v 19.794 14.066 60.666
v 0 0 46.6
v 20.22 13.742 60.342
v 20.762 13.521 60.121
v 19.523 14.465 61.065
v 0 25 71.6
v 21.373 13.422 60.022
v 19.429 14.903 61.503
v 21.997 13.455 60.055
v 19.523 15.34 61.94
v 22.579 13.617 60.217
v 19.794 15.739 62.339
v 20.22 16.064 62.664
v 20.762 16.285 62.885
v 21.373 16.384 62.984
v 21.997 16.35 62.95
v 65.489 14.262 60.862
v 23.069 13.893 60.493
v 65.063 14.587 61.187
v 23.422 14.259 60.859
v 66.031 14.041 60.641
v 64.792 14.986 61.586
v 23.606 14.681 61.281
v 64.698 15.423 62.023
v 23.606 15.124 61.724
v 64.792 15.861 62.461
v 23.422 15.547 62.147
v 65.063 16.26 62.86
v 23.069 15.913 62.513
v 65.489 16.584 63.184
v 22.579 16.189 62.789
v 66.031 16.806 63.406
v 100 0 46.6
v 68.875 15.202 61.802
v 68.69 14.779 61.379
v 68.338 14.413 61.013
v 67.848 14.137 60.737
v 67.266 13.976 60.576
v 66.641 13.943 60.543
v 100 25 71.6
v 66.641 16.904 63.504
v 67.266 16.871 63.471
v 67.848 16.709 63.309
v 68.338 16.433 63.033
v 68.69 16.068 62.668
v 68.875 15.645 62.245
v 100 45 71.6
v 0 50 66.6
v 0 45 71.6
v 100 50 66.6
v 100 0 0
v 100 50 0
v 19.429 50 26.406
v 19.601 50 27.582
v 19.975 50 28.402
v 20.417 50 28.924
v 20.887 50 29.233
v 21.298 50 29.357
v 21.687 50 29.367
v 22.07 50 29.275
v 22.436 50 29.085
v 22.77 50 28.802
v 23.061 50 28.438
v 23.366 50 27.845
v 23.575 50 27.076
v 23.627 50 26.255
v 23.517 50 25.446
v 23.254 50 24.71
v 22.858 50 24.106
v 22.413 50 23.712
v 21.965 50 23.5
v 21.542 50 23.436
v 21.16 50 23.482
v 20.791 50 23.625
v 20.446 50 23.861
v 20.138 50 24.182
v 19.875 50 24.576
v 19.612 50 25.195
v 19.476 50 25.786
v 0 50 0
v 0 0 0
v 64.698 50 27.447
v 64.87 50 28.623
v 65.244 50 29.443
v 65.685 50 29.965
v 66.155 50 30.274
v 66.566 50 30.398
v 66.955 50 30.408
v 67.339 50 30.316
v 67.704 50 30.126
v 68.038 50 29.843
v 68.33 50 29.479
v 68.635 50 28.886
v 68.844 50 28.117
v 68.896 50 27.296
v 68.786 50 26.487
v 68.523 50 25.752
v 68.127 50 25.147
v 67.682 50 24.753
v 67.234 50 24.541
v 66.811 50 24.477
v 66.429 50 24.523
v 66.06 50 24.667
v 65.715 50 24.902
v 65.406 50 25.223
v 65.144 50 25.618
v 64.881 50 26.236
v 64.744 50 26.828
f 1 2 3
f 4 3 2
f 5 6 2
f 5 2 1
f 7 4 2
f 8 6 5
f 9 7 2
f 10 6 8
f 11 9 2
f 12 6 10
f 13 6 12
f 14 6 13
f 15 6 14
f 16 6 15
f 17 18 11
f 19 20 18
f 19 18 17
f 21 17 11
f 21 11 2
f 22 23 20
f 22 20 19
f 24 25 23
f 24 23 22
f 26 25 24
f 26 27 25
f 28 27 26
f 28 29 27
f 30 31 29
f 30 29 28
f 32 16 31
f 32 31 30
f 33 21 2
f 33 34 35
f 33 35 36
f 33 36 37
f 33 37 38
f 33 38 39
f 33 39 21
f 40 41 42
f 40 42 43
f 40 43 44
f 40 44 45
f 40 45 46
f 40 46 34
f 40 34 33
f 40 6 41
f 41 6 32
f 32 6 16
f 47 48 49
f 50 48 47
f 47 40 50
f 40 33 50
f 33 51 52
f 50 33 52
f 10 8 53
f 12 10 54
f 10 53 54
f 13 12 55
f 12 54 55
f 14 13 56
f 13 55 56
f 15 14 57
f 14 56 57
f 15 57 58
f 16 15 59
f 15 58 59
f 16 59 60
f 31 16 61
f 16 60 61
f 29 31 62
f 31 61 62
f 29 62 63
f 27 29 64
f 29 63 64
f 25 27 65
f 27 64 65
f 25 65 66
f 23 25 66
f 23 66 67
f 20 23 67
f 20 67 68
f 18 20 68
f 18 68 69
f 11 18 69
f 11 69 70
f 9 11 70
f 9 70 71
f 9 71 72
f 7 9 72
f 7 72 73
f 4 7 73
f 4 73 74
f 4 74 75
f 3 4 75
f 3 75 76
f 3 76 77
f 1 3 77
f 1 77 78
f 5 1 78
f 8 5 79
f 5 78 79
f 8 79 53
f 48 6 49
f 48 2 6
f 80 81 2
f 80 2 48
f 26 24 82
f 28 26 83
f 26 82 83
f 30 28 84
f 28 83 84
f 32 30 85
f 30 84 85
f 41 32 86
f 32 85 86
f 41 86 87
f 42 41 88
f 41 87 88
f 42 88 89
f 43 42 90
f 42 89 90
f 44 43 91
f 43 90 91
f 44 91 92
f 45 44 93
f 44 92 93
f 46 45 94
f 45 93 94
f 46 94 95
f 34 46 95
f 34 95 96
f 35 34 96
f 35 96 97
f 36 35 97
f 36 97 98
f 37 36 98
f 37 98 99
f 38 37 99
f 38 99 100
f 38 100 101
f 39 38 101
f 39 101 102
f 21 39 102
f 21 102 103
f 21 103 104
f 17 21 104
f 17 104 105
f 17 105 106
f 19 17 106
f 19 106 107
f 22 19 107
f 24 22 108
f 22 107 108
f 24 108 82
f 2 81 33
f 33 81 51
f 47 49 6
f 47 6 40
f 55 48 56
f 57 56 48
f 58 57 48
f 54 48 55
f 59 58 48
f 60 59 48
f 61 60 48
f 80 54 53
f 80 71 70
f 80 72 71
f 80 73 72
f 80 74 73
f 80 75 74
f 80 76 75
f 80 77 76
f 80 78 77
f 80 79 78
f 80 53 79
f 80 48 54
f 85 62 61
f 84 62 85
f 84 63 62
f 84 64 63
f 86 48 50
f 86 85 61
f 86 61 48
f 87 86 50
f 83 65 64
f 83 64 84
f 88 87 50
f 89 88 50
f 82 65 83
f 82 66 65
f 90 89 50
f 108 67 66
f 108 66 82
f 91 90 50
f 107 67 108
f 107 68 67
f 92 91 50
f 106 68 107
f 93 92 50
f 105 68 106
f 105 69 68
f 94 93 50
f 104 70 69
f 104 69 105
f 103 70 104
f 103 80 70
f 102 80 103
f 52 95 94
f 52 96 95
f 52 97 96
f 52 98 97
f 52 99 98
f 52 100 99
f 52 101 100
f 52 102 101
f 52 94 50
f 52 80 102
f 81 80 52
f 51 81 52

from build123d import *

# Parameters (mm, degrees)
F0_W     = 100
F0_H     = 50
F1_DEPTH = 71.6
F2_SIZE  = 25
F4_D     = 4.2
F5_SIZE  = 5


with BuildPart() as f1:
    # F0 (on Top) → F1 (new body)
    with BuildSketch(Plane.XY):
        with Locations((50, 25)):
            Rectangle(F0_W, F0_H)
    extrude(amount=F1_DEPTH)

    # F2
    f2_edges = [f1.edges().sort_by_distance(p)[0] for p in [
        (50, 0, 71.6),
    ]]
    chamfer(f2_edges, length=F2_SIZE)

    # F4 (through all)
    with Locations(Plane(origin=(0, -23.3, 23.3), x_dir=(1, 0, 0), z_dir=(0, -0.7071067812, 0.7071067812))):
        with Locations((66.7982175946, 54.7630861402), (21.5294957161, 54.0269054472)):
            Hole(F4_D / 2)

    # F5
    f5_edges = [f1.edges().sort_by_distance(p)[0] for p in [
        (50, 50, 71.6),
    ]]
    chamfer(f5_edges, length=F5_SIZE)


solid = f1.part
